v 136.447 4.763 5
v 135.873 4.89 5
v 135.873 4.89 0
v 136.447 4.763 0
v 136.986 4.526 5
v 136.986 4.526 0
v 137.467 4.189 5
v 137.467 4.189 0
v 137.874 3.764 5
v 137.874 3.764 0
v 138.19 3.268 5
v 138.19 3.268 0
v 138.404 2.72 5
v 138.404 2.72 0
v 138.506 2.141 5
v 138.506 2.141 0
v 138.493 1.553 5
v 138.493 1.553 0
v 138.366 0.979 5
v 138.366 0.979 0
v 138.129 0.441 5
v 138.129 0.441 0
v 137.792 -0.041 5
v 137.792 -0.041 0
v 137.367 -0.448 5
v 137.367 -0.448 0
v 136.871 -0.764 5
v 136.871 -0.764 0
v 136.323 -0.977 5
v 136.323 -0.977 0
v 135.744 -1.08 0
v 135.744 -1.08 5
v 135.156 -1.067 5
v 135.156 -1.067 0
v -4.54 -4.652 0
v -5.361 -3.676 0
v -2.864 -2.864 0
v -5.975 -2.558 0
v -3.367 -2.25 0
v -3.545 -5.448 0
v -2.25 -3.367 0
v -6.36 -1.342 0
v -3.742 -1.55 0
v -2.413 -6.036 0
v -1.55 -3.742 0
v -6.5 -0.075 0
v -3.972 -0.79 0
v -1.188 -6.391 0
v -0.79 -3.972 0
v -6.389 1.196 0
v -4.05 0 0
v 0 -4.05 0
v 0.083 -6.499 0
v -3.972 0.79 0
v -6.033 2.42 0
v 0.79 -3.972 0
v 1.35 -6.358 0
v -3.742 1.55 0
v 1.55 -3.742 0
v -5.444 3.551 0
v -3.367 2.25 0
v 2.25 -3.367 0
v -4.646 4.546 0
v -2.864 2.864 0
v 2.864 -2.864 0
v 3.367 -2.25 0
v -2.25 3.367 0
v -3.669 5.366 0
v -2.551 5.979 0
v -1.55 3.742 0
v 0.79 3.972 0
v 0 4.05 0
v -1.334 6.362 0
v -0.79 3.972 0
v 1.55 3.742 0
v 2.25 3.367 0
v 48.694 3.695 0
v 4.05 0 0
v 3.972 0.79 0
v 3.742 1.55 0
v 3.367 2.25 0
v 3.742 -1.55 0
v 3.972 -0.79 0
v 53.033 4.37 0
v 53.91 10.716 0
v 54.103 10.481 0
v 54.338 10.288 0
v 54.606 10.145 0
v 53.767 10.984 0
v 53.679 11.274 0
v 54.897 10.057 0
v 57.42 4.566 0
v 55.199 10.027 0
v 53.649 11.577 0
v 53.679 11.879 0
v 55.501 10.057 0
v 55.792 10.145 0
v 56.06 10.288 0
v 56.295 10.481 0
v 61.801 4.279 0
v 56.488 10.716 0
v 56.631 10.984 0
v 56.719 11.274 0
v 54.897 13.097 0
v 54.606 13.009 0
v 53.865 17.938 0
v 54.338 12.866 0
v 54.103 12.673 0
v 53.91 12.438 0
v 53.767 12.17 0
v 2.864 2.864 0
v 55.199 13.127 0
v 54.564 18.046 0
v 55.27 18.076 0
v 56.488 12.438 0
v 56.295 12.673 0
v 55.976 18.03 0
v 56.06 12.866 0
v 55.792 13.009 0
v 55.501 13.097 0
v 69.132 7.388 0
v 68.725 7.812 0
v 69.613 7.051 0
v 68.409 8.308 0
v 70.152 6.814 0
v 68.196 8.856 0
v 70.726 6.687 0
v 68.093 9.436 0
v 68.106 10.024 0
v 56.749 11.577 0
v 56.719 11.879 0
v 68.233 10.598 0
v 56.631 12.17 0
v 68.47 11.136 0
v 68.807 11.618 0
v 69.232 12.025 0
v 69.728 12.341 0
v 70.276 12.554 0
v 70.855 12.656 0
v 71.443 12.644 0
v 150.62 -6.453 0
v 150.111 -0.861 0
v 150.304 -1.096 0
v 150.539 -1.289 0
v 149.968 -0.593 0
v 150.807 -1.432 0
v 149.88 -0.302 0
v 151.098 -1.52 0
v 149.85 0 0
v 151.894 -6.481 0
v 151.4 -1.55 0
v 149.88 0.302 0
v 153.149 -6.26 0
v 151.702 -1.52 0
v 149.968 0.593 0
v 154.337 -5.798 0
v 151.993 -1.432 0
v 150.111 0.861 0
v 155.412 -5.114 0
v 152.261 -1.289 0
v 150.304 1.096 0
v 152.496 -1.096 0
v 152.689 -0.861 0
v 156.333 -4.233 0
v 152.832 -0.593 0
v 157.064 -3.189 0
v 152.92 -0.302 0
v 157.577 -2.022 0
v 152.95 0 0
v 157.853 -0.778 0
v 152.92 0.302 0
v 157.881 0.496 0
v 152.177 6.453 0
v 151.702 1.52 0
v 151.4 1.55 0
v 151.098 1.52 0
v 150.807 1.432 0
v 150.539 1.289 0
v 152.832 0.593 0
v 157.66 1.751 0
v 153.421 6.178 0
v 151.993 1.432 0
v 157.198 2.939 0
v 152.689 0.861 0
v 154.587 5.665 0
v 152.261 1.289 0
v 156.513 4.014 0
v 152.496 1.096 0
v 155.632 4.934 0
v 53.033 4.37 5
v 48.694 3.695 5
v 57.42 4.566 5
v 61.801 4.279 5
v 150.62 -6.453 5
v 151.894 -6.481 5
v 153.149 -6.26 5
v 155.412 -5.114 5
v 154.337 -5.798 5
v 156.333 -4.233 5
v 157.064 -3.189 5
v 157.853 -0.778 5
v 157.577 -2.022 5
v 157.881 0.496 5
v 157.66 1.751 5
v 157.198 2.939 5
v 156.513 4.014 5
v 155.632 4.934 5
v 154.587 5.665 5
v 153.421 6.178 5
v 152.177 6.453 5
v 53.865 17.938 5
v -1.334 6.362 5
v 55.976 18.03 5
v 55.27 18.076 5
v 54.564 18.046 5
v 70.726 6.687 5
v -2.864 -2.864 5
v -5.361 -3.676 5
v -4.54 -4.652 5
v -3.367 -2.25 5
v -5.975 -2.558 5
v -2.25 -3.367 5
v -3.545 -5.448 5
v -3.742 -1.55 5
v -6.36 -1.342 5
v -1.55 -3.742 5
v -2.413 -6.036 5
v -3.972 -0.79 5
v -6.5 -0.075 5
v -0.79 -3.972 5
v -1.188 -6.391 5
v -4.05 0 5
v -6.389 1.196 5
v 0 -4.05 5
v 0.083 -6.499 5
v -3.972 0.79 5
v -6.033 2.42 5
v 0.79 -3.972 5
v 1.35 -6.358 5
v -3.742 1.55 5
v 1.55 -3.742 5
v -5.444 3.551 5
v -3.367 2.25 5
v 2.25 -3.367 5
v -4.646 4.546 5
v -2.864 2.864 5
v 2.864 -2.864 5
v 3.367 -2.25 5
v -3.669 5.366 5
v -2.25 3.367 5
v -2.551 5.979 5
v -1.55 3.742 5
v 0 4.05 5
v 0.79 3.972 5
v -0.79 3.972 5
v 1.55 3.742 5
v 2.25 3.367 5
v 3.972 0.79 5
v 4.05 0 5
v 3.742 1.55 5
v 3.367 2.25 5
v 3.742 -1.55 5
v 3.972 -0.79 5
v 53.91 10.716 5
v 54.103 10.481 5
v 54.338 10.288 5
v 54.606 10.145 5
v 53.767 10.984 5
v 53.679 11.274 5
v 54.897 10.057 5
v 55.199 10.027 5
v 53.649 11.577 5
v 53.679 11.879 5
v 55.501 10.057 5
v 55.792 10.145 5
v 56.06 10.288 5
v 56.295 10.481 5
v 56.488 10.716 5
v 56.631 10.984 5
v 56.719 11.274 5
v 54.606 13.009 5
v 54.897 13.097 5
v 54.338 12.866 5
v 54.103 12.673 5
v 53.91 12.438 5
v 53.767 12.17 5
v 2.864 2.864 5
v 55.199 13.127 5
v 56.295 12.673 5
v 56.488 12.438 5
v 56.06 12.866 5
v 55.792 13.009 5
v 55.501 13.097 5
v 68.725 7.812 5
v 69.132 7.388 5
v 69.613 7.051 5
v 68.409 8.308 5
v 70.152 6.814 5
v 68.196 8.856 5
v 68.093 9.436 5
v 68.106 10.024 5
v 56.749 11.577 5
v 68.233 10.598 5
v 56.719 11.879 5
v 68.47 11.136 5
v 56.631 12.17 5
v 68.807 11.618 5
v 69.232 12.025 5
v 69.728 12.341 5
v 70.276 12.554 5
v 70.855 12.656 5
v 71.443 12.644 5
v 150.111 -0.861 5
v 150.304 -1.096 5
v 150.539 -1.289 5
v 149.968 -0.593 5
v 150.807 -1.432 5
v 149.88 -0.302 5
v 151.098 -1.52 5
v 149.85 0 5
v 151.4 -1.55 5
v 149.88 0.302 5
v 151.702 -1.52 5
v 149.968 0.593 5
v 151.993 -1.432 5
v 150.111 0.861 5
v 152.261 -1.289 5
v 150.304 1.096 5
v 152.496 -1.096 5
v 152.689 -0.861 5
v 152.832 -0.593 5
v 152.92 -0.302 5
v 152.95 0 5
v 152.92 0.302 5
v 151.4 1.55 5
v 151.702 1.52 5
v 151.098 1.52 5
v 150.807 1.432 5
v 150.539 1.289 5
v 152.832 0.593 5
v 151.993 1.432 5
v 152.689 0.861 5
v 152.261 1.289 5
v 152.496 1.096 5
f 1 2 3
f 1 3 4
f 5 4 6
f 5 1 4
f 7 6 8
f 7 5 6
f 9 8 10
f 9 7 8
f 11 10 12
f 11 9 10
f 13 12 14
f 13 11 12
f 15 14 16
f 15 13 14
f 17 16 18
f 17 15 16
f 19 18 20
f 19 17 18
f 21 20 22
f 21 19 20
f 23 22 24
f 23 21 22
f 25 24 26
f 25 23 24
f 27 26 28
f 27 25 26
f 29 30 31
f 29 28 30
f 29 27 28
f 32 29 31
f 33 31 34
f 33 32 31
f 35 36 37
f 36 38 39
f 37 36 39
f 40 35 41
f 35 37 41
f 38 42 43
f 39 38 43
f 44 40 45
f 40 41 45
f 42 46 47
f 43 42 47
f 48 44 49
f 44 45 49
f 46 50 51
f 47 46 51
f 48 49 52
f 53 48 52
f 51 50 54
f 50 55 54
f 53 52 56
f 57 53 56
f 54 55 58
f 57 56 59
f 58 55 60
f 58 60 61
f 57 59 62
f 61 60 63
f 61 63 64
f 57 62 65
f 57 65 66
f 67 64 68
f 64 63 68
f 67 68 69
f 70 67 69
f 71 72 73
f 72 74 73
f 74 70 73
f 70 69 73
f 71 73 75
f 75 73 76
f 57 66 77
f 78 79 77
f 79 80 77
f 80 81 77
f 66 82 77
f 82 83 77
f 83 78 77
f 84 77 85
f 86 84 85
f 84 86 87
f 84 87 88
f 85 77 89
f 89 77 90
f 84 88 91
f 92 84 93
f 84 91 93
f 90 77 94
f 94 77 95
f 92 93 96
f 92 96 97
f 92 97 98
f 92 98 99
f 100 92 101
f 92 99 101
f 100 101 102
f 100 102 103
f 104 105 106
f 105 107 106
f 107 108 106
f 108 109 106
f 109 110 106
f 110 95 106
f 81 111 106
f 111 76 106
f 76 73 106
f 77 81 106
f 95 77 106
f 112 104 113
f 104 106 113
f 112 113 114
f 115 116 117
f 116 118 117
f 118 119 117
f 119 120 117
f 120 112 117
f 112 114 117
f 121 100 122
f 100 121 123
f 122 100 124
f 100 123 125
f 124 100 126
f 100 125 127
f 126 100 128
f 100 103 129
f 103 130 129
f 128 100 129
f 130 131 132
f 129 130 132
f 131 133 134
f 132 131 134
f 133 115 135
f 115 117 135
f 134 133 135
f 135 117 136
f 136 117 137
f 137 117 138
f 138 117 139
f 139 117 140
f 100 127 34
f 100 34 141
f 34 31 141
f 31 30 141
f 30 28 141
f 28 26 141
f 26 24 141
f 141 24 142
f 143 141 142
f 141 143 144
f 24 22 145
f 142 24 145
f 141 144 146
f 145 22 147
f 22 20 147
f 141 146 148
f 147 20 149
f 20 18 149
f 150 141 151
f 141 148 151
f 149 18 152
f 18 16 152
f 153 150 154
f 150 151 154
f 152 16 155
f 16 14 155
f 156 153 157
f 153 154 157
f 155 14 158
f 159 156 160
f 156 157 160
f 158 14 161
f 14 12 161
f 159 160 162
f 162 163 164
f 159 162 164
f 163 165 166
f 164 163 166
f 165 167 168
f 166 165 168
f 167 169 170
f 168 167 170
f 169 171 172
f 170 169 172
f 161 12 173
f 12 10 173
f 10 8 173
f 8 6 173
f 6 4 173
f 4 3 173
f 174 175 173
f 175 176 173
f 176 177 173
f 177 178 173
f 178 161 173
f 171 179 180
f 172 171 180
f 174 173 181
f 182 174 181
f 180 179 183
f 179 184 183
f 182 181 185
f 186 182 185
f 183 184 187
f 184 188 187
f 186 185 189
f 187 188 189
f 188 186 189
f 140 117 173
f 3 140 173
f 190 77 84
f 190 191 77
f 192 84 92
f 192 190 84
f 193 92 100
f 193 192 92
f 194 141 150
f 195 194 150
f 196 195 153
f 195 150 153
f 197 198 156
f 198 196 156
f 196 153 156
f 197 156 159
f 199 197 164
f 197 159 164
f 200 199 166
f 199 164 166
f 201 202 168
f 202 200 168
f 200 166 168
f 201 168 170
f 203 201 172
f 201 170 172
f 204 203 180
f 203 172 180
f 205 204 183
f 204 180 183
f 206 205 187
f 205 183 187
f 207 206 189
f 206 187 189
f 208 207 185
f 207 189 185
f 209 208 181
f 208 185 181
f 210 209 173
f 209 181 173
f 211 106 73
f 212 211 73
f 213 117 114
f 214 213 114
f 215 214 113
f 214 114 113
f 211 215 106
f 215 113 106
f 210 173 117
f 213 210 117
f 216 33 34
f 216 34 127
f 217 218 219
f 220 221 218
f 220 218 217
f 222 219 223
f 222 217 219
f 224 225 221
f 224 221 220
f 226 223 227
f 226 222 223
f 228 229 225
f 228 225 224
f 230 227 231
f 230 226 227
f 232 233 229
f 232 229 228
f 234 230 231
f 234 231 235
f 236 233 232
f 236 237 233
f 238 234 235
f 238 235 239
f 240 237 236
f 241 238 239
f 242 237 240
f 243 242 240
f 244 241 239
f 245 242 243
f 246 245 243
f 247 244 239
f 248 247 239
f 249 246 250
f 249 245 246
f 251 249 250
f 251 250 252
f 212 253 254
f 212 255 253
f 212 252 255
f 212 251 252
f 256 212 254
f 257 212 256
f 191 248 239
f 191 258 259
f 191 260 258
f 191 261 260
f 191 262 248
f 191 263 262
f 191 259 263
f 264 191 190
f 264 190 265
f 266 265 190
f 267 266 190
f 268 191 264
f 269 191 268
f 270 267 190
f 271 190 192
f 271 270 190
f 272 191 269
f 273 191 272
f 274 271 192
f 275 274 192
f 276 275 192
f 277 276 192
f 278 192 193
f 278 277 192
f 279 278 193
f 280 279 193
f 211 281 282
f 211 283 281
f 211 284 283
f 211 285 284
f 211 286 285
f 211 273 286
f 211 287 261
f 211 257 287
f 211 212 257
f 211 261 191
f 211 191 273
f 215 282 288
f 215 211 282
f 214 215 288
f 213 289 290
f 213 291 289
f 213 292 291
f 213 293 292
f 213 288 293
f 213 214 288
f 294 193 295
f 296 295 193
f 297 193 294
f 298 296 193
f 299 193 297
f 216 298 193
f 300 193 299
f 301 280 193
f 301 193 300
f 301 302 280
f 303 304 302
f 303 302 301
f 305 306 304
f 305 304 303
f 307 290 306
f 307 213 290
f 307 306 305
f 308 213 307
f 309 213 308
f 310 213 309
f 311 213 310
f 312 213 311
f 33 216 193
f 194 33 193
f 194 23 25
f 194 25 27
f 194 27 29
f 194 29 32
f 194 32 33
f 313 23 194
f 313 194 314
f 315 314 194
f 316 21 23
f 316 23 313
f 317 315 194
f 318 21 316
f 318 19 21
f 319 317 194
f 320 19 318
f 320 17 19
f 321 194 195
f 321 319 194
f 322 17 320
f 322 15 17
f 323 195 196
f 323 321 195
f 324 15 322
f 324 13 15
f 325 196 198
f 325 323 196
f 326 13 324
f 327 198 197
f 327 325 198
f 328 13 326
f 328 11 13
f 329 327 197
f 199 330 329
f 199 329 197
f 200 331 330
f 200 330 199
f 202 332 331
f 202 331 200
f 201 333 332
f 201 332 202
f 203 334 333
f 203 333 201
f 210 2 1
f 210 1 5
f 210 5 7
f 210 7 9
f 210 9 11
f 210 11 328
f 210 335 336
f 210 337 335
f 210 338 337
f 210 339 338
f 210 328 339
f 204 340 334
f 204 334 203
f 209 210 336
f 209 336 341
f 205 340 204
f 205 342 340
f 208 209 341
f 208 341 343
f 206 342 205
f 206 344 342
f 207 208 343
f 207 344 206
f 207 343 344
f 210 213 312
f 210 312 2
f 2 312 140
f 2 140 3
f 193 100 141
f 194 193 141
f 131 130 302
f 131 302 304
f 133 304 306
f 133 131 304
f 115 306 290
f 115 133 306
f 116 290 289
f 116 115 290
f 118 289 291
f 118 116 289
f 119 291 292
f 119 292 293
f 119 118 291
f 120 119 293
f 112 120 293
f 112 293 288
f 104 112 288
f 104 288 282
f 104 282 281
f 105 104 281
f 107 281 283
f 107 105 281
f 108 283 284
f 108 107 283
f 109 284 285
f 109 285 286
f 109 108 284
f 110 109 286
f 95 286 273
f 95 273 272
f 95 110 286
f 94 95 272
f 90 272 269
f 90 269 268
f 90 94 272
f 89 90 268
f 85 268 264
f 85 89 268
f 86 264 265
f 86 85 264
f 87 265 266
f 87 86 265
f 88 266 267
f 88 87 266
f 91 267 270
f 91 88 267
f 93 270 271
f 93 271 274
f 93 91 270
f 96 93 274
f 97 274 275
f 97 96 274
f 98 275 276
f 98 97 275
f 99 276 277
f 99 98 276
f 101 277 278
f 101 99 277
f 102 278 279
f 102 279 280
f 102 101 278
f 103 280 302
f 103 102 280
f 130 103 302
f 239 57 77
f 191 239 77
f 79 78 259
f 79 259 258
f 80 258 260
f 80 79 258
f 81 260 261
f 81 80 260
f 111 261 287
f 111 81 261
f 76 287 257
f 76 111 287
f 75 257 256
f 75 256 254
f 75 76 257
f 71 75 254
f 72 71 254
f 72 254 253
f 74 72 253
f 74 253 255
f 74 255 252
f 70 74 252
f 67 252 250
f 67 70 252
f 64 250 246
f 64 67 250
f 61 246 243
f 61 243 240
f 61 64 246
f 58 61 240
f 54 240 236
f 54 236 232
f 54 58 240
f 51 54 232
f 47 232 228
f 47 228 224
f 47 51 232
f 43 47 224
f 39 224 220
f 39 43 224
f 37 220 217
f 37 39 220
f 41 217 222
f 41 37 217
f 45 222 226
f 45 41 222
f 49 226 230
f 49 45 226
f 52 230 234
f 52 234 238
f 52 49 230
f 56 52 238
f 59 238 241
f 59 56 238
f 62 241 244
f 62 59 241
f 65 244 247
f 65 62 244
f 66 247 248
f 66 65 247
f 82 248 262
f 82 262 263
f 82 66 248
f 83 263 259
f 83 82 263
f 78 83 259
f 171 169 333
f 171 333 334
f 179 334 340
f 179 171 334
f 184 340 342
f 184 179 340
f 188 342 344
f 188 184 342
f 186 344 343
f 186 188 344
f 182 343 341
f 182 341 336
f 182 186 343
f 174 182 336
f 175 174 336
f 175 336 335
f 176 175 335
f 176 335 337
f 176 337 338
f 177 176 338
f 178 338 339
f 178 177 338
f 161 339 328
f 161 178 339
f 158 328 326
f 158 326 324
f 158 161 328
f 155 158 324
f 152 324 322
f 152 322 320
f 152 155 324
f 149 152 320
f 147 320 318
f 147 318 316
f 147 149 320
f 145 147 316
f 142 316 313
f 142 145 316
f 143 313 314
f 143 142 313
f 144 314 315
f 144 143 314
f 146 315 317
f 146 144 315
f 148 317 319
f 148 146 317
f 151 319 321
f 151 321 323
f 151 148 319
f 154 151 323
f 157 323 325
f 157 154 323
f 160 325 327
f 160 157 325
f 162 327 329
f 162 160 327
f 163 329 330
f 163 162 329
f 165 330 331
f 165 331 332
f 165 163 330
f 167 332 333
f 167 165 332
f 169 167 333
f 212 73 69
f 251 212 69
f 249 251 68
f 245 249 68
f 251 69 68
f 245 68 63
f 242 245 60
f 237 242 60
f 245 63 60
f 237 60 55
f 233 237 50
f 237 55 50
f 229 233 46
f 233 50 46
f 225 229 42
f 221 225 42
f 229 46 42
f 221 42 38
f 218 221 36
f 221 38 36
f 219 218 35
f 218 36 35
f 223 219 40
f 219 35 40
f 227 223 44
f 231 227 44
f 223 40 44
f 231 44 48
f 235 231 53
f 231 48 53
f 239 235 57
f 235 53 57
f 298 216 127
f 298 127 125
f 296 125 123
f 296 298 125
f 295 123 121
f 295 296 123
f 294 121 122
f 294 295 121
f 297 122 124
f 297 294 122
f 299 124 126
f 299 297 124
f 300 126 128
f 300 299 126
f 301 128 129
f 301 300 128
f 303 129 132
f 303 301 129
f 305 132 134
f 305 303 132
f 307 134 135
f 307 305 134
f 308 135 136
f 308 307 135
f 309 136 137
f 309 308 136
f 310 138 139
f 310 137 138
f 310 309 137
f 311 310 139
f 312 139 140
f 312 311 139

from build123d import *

# Parameters (mm, degrees)
SKETCH_1_R          = 6.5
SKETCH_1_R_2        = 4.05
SKETCH_1_R_3        = 1.55
EXTRUDE_1_DEPTH     = 5
FILLET_1_R          = 40
CUT_EXTRUDE_1_DEPTH = 160.010002676


with BuildPart() as part:
    # 草图1 → 凸台-拉伸1 (new body)
    # profile 1 of 5: a face of its own
    with BuildSketch(Plane.XY):
        Circle(SKETCH_1_R)
        Circle(SKETCH_1_R_2, mode=Mode.SUBTRACT)
    # profile 2 of 5: a face of its own
    with BuildSketch(Plane.XY):
        with BuildLine():
            ThreePointArc((6.5, 0), (5.051052449, -4.091071884), (1.350194104, -6.358221126))
            Line((1.350194104, -6.358221126), (55.199071912, 5.076806988))
            ThreePointArc((55.199071912, 5.076806988), (48.73376571, 10.906123973), (53.864865433, 17.938402155))
            Line((53.864865433, 17.938402155), (-1.334206479, 6.361595167))
            ThreePointArc((-1.334206479, 6.361595167), (4.09741735, 5.045906366), (6.5, 0))
        make_face()
    # profile 3 of 5: a face of its own
    with BuildSketch(Plane.XY):
        with Locations((55.199071912, 11.576806988)):
            Circle(SKETCH_1_R)
        with Locations((55.199071912, 11.576806988)):
            Circle(SKETCH_1_R_3, mode=Mode.SUBTRACT)
    # profile 4 of 5: a face of its own
    with BuildSketch(Plane.XY):
        with BuildLine():
            ThreePointArc((61.699071912, 11.576806988), (59.79526599, 6.98061291), (55.199071912, 5.076806988))
            Line((55.199071912, 5.076806988), (150.620267879, -6.45306267))
            ThreePointArc((150.620267879, -6.45306267), (144.946748663, 0.778169119), (152.176606073, 6.453439626))
            Line((152.176606073, 6.453439626), (55.975677985, 18.030246614))
            ThreePointArc((55.975677985, 18.030246614), (60.062092551, 15.88969816), (61.699071912, 11.576806988))
        make_face()
    # profile 5 of 5: a face of its own
    with BuildSketch(Plane.XY):
        with Locations((151.4, 0)):
            Circle(SKETCH_1_R)
        with Locations((151.4, 0)):
            Circle(SKETCH_1_R_3, mode=Mode.SUBTRACT)
    extrude(amount=EXTRUDE_1_DEPTH)

    # 圆角1
    fillet_1_edges = [part.edges().sort_by_distance(p)[0] for p in [
        (55.199071912, 5.076806988, 2.5),
    ]]
    fillet(fillet_1_edges, radius=FILLET_1_R)

    # 草图2 → 切除-拉伸1 (cut, through all)
    with BuildSketch(Plane.XY.offset(5)):
        with BuildLine():
            Line((71.442895333, 12.643671867), (135.873043723, 4.890156314))
            ThreePointArc((135.873043723, 4.890156314), (138.493120748, 1.553212146), (135.156176579, -1.066864879))
            Line((135.156176579, -1.066864879), (70.726028189, 6.686650674))
            ThreePointArc((70.726028189, 6.686650674), (68.105951164, 10.023594842), (71.442895333, 12.643671867))
        make_face()
    extrude(amount=-CUT_EXTRUDE_1_DEPTH, mode=Mode.SUBTRACT)


solid = part.part
